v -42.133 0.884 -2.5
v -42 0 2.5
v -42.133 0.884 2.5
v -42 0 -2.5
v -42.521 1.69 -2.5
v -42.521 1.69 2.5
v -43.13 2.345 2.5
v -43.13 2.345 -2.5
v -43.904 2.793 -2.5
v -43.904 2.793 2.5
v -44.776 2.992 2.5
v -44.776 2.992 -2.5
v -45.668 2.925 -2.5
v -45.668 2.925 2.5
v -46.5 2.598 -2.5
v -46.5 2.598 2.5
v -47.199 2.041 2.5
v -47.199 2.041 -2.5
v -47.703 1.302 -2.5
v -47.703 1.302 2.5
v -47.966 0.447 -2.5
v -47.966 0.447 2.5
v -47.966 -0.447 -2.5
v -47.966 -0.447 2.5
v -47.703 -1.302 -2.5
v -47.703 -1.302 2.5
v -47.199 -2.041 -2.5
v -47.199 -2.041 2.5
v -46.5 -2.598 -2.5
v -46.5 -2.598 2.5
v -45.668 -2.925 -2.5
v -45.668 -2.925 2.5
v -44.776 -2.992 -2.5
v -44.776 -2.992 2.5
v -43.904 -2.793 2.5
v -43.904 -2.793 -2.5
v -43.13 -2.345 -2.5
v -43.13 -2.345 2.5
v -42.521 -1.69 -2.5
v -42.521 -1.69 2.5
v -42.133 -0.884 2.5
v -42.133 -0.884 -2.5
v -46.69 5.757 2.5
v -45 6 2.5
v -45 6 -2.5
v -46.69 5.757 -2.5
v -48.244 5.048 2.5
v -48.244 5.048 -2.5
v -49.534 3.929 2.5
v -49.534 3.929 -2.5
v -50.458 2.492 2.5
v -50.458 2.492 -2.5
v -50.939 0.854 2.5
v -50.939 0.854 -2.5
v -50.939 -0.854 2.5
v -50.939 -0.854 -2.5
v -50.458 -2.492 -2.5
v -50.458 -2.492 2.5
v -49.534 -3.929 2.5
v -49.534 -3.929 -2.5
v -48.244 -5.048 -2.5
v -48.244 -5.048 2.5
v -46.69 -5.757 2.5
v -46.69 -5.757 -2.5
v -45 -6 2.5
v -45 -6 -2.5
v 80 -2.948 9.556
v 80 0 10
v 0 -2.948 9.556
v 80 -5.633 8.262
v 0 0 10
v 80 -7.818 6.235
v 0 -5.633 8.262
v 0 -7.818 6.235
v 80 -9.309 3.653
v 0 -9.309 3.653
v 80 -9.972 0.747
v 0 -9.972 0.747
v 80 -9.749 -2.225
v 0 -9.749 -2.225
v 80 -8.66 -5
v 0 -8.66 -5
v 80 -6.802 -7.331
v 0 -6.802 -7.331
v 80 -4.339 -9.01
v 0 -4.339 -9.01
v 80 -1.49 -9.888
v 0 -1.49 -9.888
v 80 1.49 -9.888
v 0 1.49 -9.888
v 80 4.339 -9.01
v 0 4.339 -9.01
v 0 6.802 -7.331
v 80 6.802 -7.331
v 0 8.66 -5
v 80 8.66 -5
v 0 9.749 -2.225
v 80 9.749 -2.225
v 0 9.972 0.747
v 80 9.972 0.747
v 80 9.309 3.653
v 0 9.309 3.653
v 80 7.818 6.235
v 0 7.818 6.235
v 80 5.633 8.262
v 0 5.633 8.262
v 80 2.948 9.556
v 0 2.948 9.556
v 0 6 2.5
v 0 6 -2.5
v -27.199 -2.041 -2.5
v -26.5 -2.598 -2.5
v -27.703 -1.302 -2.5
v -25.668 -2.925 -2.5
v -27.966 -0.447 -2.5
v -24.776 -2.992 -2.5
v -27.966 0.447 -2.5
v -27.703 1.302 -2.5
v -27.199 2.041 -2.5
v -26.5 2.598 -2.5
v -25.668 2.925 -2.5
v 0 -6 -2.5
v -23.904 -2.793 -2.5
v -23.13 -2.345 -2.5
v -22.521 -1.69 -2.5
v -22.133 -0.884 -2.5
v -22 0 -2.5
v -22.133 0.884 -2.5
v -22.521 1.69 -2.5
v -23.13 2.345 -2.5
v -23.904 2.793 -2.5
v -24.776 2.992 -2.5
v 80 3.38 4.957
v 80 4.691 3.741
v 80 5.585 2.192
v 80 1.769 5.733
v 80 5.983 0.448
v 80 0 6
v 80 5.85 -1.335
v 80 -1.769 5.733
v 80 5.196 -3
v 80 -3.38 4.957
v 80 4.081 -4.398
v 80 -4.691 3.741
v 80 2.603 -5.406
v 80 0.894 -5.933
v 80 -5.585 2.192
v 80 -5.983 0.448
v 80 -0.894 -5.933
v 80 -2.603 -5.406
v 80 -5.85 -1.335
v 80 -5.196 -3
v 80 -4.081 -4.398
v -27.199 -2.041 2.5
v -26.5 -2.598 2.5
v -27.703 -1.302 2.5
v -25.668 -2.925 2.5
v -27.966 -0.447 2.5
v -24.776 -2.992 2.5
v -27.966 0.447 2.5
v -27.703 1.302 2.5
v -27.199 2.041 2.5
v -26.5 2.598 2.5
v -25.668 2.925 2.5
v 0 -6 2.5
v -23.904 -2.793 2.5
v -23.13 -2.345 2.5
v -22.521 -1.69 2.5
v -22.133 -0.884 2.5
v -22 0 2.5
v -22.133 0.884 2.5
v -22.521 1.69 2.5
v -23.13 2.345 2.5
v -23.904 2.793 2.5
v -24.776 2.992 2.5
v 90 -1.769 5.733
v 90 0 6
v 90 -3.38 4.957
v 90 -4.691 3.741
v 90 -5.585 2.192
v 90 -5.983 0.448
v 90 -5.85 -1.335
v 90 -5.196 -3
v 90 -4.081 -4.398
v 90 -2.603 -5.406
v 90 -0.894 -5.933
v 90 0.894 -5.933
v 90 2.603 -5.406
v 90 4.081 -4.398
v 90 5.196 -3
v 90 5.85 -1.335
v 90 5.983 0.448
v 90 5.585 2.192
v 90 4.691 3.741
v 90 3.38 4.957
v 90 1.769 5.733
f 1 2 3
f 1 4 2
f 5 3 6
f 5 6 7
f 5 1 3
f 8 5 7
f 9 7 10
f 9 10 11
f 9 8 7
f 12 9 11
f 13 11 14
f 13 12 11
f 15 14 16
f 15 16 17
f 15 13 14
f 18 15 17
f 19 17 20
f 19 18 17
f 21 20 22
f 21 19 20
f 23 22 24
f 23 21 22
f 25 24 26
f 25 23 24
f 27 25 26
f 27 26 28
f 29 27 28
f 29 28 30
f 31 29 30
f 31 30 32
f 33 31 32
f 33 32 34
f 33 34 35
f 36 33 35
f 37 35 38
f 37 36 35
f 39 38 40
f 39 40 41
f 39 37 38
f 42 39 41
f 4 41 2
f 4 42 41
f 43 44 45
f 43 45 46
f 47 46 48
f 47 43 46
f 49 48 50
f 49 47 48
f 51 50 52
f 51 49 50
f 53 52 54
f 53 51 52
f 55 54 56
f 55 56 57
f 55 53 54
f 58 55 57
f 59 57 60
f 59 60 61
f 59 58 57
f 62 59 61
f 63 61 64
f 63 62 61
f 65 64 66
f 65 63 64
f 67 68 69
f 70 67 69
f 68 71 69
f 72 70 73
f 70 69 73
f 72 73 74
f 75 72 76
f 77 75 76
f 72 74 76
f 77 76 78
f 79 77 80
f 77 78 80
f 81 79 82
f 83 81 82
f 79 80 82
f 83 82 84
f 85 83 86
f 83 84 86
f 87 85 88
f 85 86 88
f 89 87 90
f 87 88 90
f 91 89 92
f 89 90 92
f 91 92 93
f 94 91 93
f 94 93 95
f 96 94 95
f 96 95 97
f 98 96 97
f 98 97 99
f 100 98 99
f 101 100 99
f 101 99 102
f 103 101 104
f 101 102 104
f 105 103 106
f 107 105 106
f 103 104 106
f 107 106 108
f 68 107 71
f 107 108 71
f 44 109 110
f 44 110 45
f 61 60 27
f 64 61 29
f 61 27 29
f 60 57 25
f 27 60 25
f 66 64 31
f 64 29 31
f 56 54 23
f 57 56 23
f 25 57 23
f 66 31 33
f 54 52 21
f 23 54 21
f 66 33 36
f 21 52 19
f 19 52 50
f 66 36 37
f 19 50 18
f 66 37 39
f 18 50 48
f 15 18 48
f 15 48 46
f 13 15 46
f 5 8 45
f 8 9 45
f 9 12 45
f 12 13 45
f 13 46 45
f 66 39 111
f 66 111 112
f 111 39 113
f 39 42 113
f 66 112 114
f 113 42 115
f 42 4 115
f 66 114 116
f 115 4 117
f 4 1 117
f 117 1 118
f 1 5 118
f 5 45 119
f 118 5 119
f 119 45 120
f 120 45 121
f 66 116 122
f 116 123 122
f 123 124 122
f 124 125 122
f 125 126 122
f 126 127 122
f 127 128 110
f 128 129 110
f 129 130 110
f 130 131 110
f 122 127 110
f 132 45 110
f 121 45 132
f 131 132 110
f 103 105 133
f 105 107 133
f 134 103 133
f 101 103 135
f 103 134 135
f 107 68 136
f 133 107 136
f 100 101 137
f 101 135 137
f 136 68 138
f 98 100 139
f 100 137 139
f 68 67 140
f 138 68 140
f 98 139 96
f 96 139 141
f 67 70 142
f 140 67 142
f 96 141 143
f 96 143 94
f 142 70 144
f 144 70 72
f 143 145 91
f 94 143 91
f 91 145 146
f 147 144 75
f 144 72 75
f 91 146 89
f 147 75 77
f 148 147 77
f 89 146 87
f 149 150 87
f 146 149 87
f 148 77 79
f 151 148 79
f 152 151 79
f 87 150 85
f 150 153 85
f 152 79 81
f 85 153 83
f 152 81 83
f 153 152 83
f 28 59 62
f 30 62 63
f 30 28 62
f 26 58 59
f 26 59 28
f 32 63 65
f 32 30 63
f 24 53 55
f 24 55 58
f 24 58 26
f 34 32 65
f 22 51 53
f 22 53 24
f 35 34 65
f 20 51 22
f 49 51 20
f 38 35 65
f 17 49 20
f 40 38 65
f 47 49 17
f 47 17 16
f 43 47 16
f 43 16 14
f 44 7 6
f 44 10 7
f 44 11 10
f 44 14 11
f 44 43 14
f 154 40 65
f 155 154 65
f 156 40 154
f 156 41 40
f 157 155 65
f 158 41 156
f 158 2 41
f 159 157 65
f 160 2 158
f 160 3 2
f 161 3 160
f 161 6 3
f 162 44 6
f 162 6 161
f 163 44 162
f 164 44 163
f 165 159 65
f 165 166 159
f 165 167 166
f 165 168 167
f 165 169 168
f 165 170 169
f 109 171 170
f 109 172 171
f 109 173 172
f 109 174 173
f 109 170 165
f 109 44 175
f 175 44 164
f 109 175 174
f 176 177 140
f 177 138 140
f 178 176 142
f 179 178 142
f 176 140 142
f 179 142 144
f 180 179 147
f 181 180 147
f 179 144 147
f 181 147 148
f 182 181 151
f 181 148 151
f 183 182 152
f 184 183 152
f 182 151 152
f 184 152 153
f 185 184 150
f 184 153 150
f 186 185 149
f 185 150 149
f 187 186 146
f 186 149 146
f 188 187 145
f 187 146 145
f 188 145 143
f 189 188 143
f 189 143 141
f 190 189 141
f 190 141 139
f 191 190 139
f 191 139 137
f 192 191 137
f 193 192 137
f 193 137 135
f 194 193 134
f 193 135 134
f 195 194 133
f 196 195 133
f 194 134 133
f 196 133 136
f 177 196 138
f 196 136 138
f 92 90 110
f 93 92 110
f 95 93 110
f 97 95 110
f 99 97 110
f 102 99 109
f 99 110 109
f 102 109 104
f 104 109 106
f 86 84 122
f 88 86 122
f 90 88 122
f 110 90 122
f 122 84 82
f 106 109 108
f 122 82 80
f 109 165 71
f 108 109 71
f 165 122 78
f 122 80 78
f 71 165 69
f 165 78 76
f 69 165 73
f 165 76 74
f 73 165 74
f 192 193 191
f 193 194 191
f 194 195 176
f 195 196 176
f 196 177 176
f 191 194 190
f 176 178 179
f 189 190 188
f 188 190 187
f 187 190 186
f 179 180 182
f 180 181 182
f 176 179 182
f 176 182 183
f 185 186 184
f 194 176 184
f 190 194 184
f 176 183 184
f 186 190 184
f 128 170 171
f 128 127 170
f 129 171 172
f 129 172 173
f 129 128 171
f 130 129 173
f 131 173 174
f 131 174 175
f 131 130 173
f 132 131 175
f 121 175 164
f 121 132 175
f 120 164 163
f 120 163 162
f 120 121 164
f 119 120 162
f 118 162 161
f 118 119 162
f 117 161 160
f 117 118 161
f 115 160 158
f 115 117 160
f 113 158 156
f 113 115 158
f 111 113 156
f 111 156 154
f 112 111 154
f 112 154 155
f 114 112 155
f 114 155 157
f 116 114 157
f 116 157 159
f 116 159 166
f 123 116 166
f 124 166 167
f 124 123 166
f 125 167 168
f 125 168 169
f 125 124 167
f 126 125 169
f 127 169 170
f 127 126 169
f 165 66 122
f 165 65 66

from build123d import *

# Parameters (mm, degrees)
SKETCH2_R           = 3
BOSS_EXTRUDE1_DEPTH = 2.5


with BuildPart() as part:
    # Sketch1 → Revolve1 (revolve)
    with BuildSketch(Plane(origin=(0, 0, 0), x_dir=(1, 0, 0), z_dir=(0, 1, 0)), mode=Mode.PRIVATE) as revolve1_sk:
        Polygon((80, 10), (0, 10), (0, 0), (90, 0), (90, 6), (80, 6), align=None)
    revolve(revolve1_sk.sketch.rotate(Axis((0, 0, 0), (1, 0, 0)), 180), axis=Axis((0, 0, 0), (1, 0, 0)))

    # Sketch2 → Boss-Extrude1 (add, symmetric)
    with BuildSketch(Plane.XY):
        with BuildLine():
            Line((0, -6), (0, 6))
            Line((0, 6), (-45, 6))
            ThreePointArc((-45, 6), (-51, 0), (-45, -6))
            Line((-45, -6), (0, -6))
        make_face()
        with Locations((-25, 0)):
            Circle(SKETCH2_R, mode=Mode.SUBTRACT)
        with Locations((-45, 0)):
            Circle(SKETCH2_R, mode=Mode.SUBTRACT)
    extrude(amount=BOSS_EXTRUDE1_DEPTH, both=True)


solid = part.part
